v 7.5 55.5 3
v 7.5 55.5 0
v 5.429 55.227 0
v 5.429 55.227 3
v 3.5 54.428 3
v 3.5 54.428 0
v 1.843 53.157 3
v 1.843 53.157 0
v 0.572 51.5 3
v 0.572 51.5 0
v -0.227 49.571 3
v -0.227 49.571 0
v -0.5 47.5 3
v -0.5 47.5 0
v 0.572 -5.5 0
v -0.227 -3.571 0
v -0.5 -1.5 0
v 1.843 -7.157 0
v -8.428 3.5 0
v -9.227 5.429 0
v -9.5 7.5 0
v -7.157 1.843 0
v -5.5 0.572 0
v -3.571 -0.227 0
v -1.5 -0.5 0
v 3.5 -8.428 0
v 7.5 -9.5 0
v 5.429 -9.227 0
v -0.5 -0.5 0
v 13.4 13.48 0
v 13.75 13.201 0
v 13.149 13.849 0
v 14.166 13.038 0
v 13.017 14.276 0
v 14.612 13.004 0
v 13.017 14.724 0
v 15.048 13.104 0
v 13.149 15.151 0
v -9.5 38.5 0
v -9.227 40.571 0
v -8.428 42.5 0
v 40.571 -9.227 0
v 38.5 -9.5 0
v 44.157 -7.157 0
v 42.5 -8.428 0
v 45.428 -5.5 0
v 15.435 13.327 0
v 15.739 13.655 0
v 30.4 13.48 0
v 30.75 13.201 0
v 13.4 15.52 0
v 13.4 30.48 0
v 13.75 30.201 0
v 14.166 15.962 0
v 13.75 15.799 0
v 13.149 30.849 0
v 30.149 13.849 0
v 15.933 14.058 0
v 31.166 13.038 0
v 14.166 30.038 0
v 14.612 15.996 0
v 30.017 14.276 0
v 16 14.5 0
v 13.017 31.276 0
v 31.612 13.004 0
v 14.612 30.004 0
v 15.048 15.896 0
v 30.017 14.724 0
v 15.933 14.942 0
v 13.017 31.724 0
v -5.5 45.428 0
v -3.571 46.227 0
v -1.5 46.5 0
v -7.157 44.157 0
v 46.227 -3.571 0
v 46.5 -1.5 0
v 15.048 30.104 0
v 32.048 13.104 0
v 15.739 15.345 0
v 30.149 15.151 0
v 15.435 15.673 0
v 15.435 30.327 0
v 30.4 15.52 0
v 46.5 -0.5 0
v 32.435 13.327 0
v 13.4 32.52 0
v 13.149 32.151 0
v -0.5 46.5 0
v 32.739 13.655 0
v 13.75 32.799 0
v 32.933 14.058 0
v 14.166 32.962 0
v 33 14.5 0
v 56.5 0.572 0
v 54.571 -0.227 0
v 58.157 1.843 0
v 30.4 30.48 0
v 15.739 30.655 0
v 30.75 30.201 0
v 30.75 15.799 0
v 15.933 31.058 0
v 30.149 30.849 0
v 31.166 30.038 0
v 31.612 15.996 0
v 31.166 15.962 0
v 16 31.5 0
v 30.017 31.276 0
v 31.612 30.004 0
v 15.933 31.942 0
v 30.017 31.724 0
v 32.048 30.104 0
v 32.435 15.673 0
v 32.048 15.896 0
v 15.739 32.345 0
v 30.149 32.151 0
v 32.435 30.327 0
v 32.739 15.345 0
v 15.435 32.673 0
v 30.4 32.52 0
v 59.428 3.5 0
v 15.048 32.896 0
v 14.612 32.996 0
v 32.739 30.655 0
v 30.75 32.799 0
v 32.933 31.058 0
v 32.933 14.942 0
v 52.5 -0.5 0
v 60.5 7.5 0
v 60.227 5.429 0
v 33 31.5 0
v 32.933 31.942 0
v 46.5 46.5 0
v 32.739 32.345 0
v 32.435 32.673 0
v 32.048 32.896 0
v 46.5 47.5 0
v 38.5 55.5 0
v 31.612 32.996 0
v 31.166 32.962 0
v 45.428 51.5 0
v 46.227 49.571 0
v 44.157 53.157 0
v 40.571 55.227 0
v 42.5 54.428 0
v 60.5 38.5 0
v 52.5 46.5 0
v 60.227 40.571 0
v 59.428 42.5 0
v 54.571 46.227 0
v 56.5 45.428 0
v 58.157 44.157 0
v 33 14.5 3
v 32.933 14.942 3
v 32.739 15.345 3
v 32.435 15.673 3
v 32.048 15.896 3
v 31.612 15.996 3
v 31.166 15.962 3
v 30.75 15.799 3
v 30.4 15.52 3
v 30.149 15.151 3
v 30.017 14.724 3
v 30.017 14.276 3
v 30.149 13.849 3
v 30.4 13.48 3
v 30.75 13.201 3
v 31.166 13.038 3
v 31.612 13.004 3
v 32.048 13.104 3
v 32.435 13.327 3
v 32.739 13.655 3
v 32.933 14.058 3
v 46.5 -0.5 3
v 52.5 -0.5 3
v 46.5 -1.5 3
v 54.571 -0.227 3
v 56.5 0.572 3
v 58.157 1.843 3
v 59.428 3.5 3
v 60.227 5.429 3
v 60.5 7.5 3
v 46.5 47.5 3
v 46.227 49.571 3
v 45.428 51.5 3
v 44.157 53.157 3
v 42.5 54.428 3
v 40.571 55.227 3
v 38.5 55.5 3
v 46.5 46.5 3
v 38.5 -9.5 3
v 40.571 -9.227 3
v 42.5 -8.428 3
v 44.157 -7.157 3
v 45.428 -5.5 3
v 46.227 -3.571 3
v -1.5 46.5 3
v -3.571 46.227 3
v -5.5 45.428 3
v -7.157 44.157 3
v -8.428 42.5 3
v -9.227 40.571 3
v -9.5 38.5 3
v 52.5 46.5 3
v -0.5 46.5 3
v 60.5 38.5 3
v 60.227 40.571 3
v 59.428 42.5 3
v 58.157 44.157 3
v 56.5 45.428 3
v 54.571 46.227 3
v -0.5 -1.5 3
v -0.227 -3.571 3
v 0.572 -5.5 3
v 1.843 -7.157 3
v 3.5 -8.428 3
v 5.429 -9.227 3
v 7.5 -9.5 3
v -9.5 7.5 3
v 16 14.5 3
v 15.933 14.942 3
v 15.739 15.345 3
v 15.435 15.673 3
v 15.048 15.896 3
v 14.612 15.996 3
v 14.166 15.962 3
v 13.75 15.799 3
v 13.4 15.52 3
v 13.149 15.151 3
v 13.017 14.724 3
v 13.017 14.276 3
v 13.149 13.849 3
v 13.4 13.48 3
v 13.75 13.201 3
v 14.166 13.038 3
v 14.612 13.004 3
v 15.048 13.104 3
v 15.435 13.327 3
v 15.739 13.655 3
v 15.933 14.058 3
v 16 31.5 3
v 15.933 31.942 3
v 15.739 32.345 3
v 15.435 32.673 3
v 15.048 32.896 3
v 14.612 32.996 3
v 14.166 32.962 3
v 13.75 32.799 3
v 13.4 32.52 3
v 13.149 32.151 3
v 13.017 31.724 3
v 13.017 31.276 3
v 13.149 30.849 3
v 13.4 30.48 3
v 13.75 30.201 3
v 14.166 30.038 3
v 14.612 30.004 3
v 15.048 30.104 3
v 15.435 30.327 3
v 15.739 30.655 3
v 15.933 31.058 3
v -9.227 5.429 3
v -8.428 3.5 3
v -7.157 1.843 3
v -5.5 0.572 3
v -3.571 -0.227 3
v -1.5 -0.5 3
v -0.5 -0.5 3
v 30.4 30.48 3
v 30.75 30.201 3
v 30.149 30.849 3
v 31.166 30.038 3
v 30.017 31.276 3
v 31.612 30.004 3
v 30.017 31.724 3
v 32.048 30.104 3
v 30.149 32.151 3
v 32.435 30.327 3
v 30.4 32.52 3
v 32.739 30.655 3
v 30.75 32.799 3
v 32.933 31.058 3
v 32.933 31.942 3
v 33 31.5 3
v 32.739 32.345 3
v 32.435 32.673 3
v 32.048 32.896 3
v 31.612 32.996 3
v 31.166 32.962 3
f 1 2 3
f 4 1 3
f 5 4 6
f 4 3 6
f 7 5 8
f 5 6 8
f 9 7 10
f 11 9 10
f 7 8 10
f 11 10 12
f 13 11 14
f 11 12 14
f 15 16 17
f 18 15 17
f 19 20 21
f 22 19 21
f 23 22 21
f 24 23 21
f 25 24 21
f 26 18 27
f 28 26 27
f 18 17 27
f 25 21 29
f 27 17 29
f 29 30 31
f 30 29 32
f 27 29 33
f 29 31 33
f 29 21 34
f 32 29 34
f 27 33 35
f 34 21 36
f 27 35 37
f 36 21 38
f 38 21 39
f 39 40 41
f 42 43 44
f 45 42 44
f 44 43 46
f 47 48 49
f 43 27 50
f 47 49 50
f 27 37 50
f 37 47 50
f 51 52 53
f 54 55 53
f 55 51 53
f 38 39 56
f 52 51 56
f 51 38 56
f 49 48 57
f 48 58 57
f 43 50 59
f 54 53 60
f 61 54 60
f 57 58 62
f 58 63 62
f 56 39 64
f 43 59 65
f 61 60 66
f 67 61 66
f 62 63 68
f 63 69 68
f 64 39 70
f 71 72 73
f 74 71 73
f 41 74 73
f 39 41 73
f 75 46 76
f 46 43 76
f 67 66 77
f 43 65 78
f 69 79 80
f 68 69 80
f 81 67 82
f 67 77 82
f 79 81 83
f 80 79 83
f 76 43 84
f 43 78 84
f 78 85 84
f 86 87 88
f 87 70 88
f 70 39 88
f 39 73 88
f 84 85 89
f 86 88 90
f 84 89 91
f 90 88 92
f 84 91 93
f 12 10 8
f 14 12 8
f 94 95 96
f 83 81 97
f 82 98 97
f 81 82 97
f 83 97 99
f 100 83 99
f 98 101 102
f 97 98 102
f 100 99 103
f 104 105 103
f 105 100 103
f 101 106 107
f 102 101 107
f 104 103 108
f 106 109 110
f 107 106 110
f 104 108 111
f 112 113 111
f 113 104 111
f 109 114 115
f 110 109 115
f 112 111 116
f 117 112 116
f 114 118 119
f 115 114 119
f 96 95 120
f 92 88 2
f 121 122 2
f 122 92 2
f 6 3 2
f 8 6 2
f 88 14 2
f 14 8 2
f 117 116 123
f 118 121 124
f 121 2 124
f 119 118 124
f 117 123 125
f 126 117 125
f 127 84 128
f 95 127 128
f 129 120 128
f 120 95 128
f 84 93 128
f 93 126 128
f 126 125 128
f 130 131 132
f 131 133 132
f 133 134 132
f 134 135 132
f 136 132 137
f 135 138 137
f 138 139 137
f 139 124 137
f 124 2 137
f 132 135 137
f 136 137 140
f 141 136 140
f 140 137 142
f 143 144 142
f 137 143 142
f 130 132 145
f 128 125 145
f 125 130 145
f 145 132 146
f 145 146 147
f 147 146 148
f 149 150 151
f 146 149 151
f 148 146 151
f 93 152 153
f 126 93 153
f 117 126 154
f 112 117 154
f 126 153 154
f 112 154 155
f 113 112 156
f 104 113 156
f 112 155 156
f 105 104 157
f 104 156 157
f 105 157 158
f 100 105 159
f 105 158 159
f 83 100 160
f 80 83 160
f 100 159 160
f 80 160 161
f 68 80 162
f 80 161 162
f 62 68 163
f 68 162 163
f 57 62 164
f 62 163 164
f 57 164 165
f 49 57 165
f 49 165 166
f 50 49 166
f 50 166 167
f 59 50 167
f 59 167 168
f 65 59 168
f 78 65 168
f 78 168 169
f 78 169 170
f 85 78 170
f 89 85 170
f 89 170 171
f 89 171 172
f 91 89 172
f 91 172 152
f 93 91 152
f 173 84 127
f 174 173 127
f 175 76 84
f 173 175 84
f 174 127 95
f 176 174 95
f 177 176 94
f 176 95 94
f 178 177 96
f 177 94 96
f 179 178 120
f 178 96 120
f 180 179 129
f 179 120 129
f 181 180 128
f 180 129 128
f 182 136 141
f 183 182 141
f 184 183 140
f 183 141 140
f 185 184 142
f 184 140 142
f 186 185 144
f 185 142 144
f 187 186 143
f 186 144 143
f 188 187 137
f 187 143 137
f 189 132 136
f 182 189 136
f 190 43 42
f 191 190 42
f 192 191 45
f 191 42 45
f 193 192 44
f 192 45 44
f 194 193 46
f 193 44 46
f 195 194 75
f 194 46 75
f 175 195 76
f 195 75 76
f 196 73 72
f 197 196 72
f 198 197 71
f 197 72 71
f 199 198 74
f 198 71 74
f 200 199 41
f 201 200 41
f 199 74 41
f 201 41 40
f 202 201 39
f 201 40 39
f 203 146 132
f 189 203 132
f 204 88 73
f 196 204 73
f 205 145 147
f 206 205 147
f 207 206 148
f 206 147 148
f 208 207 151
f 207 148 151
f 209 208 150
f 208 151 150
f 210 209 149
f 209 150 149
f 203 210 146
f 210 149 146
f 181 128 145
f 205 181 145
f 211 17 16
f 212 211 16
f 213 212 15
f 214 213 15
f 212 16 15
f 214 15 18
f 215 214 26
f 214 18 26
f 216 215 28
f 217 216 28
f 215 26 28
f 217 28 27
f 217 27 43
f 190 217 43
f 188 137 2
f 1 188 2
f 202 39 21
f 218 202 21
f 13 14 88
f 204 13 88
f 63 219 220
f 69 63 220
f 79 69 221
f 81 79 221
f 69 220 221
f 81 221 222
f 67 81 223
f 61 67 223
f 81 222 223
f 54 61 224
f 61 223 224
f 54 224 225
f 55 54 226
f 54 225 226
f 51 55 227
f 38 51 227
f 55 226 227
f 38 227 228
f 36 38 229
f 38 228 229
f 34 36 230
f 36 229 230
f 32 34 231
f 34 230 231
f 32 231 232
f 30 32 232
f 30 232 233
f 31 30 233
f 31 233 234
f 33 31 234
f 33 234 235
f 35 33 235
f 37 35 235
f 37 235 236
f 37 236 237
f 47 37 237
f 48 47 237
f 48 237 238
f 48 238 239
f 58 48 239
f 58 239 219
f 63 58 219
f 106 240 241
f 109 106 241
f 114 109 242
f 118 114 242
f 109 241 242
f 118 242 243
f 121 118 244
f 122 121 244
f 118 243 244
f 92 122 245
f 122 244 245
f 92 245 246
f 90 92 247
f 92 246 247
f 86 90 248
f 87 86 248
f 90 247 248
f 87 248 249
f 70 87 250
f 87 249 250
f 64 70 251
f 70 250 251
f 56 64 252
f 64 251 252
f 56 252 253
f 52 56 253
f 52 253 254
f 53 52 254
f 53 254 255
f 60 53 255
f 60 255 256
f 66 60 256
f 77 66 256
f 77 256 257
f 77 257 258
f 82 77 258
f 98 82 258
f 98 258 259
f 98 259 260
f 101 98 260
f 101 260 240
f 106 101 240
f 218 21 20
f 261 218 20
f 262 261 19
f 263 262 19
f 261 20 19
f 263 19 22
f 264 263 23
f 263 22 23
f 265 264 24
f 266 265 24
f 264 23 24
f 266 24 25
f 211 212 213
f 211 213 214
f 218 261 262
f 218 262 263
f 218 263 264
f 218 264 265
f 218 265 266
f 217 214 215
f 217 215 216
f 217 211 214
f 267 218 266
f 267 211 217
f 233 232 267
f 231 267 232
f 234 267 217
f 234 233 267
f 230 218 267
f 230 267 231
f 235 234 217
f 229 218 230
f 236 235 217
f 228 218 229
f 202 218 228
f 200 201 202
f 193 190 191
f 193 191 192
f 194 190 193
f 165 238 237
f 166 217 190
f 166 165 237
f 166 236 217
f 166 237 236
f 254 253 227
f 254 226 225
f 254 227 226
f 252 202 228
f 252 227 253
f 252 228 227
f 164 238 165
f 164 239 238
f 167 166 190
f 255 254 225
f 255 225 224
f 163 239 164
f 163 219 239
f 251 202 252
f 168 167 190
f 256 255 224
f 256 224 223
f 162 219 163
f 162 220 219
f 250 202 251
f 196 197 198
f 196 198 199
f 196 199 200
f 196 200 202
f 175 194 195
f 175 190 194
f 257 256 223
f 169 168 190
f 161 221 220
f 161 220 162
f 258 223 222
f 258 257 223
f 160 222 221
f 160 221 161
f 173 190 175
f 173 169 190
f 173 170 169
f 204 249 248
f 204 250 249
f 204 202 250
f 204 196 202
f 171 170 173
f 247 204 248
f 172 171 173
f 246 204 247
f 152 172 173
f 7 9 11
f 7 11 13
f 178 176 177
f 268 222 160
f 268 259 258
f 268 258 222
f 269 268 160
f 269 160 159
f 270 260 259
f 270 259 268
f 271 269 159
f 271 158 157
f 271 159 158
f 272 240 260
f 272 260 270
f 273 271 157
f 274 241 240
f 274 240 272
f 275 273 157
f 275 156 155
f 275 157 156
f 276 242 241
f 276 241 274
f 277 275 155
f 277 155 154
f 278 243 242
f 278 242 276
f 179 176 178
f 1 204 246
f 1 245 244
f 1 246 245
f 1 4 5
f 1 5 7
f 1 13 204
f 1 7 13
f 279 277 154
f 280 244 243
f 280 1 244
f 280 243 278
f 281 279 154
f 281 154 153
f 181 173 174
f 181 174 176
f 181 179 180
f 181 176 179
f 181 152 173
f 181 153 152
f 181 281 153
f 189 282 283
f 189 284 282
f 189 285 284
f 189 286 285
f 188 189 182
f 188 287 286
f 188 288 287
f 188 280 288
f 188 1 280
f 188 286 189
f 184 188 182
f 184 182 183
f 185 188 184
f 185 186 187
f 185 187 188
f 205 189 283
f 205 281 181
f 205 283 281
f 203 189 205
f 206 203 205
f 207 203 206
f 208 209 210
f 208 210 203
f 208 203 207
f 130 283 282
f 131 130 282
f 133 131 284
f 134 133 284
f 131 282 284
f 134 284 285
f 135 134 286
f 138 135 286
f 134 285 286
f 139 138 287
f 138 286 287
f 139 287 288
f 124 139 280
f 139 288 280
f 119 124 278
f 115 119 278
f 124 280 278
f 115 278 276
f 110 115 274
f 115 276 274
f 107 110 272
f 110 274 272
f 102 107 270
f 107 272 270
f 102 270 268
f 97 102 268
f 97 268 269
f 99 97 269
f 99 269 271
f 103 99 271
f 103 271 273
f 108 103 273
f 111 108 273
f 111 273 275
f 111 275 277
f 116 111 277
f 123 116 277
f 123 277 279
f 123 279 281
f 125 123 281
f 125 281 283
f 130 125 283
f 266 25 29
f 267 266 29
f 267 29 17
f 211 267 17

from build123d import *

# Parameters (mm, degrees)
RESSALTO_EXTRUS_O1_DEPTH = 3
ESBO_O5_R                = 1.5
CORTE_EXTRUS_O1_DEPTH    = 4


with BuildPart() as part:
    # Esboço1 → Ressalto-extrusão1 (new body)
    with BuildSketch(Plane.XY):
        with BuildLine():
            Line((7.5, -9.5), (38.5, -9.5))
            ThreePointArc((38.5, -9.5), (44.156854249, -7.156854249), (46.5, -1.5))
            Line((46.5, -1.5), (46.5, -0.5))
            Line((46.5, -0.5), (52.5, -0.5))
            ThreePointArc((52.5, -0.5), (58.156854249, 1.843145751), (60.5, 7.5))
            Line((60.5, 7.5), (60.5, 38.5))
            ThreePointArc((60.5, 38.5), (58.156854249, 44.156854249), (52.5, 46.5))
            Line((52.5, 46.5), (46.5, 46.5))
            Line((46.5, 46.5), (46.5, 47.5))
            ThreePointArc((46.5, 47.5), (44.156854249, 53.156854249), (38.5, 55.5))
            Line((38.5, 55.5), (7.5, 55.5))
            ThreePointArc((7.5, 55.5), (1.843145751, 53.156854249), (-0.5, 47.5))
            Line((-0.5, 47.5), (-0.5, 46.5))
            Line((-0.5, 46.5), (-1.5, 46.5))
            ThreePointArc((-1.5, 46.5), (-7.156854249, 44.156854249), (-9.5, 38.5))
            Line((-9.5, 38.5), (-9.5, 7.5))
            ThreePointArc((-9.5, 7.5), (-7.156854249, 1.843145751), (-1.5, -0.5))
            Line((-1.5, -0.5), (-0.5, -0.5))
            Line((-0.5, -0.5), (-0.5, -1.5))
            ThreePointArc((-0.5, -1.5), (1.843145751, -7.156854249), (7.5, -9.5))
        make_face()
    extrude(amount=RESSALTO_EXTRUS_O1_DEPTH)

    # Esboço5 → Corte-extrusão1 (cut, through all)
    with BuildSketch(Plane.XY.offset(3)):
        with Locations((31.5, 31.5)):
            Circle(ESBO_O5_R)
        with Locations((14.5, 31.5)):
            Circle(ESBO_O5_R)
        with Locations((14.5, 14.5)):
            Circle(ESBO_O5_R)
        with Locations((31.5, 14.5)):
            Circle(ESBO_O5_R)
    extrude(amount=-CORTE_EXTRUS_O1_DEPTH, mode=Mode.SUBTRACT)


solid = part.part
